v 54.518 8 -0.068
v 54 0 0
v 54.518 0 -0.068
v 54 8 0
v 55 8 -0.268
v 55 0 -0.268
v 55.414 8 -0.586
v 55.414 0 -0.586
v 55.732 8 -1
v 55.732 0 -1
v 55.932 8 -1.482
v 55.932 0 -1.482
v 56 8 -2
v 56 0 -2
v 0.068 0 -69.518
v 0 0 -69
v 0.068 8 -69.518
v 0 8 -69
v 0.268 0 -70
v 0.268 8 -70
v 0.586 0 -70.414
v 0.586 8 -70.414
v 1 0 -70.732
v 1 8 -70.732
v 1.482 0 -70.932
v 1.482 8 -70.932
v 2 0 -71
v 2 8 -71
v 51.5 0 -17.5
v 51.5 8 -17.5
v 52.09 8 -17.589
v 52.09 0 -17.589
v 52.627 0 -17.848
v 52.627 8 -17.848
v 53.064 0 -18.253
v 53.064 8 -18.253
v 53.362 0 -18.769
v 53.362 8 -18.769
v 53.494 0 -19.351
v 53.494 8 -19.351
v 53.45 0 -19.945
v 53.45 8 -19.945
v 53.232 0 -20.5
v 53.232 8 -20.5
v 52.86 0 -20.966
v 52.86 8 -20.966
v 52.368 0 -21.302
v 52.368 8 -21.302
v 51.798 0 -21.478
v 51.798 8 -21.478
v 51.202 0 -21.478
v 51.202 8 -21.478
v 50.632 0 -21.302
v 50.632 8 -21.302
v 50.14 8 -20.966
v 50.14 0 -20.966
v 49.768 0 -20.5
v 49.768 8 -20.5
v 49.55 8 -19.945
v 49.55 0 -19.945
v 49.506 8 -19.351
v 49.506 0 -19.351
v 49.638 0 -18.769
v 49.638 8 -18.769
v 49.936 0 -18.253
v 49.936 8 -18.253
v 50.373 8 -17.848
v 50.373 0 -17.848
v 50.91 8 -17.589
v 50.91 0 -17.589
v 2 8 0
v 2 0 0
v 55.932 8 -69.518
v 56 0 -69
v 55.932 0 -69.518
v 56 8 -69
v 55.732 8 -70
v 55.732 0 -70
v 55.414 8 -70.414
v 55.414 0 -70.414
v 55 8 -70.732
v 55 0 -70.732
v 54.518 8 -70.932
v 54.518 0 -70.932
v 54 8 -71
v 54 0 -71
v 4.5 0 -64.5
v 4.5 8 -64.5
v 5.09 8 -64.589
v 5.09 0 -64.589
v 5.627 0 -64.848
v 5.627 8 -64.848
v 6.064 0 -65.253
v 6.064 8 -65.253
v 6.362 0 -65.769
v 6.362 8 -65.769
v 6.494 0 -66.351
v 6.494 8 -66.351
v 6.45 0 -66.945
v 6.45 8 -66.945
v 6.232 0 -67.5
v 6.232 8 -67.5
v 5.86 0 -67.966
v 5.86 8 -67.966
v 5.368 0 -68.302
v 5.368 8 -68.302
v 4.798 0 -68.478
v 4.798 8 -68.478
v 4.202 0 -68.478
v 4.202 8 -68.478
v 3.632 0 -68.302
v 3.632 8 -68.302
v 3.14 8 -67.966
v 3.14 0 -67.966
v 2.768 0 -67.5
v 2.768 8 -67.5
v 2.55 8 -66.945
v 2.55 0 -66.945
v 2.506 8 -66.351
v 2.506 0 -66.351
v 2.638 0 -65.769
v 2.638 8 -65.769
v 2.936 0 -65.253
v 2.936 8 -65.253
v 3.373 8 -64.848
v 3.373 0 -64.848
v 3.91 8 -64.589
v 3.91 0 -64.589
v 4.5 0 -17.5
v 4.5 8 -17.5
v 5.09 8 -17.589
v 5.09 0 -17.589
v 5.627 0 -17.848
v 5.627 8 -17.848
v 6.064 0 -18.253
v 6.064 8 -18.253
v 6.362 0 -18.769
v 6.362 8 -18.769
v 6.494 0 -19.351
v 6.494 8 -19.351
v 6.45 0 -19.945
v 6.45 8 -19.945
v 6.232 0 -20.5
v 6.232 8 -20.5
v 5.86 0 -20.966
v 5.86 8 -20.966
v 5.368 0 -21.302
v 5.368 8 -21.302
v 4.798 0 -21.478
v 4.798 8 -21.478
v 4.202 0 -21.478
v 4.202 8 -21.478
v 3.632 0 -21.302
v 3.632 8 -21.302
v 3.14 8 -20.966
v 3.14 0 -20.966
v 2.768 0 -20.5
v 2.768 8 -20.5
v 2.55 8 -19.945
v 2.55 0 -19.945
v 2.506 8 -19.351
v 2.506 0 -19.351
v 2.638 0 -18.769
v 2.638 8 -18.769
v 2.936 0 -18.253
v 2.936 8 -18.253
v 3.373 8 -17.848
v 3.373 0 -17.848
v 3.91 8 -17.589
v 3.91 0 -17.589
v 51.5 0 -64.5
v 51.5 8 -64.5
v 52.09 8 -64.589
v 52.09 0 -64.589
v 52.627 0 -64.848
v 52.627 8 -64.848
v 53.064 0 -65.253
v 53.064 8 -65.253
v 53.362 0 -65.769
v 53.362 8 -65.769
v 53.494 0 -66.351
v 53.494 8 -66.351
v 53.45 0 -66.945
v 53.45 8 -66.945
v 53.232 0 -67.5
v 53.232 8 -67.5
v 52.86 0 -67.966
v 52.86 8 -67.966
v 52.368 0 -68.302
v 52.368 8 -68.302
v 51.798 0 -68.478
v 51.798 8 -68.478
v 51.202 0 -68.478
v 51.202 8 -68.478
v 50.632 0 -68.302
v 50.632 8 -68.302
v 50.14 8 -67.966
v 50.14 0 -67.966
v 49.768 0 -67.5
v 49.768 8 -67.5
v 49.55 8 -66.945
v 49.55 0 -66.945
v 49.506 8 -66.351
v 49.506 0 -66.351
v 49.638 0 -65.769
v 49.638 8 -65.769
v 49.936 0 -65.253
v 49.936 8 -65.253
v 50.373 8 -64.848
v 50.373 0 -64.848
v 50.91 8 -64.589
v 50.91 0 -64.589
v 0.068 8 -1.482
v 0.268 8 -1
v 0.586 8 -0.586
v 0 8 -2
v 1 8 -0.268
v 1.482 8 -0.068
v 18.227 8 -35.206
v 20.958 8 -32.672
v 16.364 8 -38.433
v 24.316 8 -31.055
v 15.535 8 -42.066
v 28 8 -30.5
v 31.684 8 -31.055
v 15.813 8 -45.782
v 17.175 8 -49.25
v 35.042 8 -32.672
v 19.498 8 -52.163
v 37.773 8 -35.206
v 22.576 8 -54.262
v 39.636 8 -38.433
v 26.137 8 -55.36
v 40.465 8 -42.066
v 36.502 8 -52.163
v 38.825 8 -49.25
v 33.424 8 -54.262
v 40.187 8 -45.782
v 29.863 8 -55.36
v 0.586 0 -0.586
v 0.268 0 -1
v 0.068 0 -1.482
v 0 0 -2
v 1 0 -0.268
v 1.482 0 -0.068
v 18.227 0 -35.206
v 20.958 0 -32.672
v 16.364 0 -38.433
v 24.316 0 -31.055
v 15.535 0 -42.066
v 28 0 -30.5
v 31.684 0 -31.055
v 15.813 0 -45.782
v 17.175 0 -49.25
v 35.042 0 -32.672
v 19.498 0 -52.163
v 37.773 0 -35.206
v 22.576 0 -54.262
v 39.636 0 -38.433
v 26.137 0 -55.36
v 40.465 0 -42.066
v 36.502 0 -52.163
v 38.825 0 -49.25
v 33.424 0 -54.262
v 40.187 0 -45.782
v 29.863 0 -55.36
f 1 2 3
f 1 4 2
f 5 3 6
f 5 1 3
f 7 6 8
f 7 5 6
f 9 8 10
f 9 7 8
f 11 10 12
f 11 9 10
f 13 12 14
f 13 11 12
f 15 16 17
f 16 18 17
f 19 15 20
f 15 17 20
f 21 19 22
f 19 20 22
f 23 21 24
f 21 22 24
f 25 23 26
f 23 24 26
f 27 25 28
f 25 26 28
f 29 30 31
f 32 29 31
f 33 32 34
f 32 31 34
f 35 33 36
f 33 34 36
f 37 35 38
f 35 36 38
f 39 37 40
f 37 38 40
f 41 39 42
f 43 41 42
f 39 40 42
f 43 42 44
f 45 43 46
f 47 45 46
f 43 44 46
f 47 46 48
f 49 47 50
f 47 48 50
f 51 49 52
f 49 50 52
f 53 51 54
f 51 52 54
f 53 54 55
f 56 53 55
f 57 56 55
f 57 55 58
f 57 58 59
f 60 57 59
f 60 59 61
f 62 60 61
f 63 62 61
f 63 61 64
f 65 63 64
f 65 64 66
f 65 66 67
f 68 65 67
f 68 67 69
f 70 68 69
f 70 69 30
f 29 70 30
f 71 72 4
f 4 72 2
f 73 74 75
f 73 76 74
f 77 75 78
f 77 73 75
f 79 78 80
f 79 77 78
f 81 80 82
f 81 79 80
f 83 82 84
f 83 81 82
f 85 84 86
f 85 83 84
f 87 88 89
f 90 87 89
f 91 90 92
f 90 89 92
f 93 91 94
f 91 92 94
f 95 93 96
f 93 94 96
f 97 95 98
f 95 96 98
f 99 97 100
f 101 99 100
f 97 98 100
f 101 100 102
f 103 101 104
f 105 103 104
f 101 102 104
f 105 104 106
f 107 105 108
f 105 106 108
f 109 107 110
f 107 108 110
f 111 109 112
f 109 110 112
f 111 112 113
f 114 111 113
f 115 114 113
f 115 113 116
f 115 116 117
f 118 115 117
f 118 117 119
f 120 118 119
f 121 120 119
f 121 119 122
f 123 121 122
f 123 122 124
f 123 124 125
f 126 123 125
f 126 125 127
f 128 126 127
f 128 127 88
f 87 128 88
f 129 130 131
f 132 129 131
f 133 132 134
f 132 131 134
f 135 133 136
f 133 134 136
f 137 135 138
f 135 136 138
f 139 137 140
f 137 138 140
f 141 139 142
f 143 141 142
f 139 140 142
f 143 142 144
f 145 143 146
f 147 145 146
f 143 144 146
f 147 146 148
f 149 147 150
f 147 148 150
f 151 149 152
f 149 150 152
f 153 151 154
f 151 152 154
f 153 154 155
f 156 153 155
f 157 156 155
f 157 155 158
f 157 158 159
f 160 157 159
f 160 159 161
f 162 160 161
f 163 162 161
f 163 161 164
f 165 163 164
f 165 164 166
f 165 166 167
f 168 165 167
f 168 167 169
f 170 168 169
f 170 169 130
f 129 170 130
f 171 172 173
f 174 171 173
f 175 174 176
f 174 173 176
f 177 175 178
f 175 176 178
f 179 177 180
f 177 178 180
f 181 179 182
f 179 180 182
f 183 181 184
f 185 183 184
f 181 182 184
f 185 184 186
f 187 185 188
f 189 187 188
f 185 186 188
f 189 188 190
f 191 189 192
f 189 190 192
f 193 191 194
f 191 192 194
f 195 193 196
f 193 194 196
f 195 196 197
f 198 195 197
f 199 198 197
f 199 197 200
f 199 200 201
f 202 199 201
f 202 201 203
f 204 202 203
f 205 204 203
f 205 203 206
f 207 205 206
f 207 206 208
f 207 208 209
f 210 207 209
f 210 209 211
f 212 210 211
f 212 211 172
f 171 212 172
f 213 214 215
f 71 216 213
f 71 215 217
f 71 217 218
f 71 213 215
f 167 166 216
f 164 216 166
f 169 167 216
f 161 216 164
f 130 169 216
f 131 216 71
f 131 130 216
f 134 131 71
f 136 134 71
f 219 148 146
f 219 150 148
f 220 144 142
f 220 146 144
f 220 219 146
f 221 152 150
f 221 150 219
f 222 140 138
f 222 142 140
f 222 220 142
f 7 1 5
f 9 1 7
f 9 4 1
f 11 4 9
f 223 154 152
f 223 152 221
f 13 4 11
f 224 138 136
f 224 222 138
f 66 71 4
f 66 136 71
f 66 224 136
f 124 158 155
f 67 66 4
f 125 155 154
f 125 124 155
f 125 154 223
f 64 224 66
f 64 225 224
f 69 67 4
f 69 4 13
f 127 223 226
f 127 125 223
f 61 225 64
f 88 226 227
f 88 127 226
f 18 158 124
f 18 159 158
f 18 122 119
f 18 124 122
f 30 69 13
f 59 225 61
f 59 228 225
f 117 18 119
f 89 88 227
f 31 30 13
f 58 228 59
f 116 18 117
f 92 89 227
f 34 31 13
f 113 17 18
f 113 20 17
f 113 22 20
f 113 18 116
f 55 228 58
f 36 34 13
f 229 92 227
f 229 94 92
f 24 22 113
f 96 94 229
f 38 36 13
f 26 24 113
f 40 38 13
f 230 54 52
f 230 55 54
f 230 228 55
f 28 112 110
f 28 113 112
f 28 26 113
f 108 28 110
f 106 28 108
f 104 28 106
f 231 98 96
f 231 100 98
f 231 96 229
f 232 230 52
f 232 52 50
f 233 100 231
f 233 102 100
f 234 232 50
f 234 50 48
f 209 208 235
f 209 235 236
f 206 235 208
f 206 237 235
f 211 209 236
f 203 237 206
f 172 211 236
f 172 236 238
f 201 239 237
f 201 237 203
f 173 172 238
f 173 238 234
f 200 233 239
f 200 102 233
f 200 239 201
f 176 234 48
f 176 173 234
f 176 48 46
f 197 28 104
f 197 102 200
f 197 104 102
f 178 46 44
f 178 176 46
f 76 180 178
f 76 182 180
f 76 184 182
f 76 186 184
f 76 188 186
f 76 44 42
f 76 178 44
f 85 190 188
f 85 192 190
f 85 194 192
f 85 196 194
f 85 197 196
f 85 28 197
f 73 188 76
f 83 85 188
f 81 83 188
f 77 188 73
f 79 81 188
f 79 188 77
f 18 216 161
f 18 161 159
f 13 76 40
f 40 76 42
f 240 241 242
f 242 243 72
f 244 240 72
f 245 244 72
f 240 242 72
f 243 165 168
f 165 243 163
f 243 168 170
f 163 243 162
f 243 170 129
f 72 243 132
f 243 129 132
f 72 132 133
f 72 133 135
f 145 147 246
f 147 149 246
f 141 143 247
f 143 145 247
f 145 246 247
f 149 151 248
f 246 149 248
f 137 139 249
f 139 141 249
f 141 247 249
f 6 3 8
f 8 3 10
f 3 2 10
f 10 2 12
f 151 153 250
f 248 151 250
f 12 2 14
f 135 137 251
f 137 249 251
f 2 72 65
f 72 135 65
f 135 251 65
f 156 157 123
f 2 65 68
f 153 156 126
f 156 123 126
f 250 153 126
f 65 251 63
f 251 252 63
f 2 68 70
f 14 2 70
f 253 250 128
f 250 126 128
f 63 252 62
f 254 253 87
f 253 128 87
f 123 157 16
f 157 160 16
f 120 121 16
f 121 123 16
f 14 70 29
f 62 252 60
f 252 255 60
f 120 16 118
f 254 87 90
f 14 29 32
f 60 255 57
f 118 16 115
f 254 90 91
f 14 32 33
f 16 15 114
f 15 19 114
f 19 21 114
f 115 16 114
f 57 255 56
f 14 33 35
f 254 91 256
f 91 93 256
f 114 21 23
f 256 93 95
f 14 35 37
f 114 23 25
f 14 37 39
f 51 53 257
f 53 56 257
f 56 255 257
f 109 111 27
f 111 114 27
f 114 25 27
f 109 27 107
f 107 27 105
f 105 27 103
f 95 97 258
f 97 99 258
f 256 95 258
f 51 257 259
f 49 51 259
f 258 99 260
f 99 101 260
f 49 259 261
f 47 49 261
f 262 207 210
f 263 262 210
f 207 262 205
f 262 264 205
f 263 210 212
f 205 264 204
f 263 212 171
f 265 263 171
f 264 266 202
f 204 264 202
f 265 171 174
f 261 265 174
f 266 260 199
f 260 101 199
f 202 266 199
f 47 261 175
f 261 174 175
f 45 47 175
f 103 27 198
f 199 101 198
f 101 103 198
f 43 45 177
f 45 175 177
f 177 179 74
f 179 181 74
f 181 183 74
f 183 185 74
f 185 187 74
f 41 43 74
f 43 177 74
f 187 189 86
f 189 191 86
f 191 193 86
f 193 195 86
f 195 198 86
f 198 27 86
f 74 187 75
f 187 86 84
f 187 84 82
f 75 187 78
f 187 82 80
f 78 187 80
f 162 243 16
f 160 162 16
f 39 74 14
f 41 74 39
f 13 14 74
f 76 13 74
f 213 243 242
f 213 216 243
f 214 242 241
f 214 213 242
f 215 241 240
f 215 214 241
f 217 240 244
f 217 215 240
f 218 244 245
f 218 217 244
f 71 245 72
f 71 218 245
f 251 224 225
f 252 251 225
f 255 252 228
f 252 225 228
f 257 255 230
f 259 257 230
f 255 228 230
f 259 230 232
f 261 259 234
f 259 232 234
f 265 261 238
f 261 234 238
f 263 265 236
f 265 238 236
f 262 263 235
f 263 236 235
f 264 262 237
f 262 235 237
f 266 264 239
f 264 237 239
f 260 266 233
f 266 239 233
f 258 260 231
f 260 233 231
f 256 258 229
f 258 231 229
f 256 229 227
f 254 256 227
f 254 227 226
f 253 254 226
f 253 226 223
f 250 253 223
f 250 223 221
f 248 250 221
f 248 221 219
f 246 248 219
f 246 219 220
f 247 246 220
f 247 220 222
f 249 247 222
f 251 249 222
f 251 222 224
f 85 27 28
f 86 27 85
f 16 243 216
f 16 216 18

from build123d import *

# Parameters (mm, degrees)
SKETCH1_W           = 56
SKETCH1_H           = 71
BOSS_EXTRUDE1_DEPTH = 8
FILLET1_R           = 2
SKETCH2_R           = 2
SKETCH2_R_2         = 12.5
CUT_EXTRUDE1_DEPTH  = 91.779953734


with BuildPart() as part:
    # Sketch1 → Boss-Extrude1 (new body)
    with BuildSketch(Plane(origin=(0, 0, 0), x_dir=(1, 0, 0), z_dir=(0, 1, 0))):
        with Locations((28, 35.5)):
            Rectangle(SKETCH1_W, SKETCH1_H)
    extrude(amount=BOSS_EXTRUDE1_DEPTH)

    # Fillet1
    fillet1_edges = [part.edges().sort_by_distance(p)[0] for p in [
        (0, 4, -71),
        (56, 4, -71),
        (56, 4, 0),
        (0, 4, 0),
    ]]
    fillet(fillet1_edges, radius=FILLET1_R)

    # Sketch2 → Cut-Extrude1 (cut, through all)
    with BuildSketch(Plane(origin=(0, 8, 0), x_dir=(1, 0, 0), z_dir=(0, 1, 0))):
        with Locations(Location((4.5, 66.5, 0), (0, 0, 270))):
            Circle(SKETCH2_R)
        with Locations(Location((51.5, 66.5, 0), (0, 0, 270))):
            Circle(SKETCH2_R)
        with Locations(Location((51.5, 19.5, 0), (0, 0, 270))):
            Circle(SKETCH2_R)
        with Locations(Location((4.5, 19.5, 0), (0, 0, 270))):
            Circle(SKETCH2_R)
        with Locations(Location((28, 43, 0), (0, 0, 270))):
            Circle(SKETCH2_R_2)
    extrude(amount=-CUT_EXTRUDE1_DEPTH, mode=Mode.SUBTRACT)


solid = part.part
